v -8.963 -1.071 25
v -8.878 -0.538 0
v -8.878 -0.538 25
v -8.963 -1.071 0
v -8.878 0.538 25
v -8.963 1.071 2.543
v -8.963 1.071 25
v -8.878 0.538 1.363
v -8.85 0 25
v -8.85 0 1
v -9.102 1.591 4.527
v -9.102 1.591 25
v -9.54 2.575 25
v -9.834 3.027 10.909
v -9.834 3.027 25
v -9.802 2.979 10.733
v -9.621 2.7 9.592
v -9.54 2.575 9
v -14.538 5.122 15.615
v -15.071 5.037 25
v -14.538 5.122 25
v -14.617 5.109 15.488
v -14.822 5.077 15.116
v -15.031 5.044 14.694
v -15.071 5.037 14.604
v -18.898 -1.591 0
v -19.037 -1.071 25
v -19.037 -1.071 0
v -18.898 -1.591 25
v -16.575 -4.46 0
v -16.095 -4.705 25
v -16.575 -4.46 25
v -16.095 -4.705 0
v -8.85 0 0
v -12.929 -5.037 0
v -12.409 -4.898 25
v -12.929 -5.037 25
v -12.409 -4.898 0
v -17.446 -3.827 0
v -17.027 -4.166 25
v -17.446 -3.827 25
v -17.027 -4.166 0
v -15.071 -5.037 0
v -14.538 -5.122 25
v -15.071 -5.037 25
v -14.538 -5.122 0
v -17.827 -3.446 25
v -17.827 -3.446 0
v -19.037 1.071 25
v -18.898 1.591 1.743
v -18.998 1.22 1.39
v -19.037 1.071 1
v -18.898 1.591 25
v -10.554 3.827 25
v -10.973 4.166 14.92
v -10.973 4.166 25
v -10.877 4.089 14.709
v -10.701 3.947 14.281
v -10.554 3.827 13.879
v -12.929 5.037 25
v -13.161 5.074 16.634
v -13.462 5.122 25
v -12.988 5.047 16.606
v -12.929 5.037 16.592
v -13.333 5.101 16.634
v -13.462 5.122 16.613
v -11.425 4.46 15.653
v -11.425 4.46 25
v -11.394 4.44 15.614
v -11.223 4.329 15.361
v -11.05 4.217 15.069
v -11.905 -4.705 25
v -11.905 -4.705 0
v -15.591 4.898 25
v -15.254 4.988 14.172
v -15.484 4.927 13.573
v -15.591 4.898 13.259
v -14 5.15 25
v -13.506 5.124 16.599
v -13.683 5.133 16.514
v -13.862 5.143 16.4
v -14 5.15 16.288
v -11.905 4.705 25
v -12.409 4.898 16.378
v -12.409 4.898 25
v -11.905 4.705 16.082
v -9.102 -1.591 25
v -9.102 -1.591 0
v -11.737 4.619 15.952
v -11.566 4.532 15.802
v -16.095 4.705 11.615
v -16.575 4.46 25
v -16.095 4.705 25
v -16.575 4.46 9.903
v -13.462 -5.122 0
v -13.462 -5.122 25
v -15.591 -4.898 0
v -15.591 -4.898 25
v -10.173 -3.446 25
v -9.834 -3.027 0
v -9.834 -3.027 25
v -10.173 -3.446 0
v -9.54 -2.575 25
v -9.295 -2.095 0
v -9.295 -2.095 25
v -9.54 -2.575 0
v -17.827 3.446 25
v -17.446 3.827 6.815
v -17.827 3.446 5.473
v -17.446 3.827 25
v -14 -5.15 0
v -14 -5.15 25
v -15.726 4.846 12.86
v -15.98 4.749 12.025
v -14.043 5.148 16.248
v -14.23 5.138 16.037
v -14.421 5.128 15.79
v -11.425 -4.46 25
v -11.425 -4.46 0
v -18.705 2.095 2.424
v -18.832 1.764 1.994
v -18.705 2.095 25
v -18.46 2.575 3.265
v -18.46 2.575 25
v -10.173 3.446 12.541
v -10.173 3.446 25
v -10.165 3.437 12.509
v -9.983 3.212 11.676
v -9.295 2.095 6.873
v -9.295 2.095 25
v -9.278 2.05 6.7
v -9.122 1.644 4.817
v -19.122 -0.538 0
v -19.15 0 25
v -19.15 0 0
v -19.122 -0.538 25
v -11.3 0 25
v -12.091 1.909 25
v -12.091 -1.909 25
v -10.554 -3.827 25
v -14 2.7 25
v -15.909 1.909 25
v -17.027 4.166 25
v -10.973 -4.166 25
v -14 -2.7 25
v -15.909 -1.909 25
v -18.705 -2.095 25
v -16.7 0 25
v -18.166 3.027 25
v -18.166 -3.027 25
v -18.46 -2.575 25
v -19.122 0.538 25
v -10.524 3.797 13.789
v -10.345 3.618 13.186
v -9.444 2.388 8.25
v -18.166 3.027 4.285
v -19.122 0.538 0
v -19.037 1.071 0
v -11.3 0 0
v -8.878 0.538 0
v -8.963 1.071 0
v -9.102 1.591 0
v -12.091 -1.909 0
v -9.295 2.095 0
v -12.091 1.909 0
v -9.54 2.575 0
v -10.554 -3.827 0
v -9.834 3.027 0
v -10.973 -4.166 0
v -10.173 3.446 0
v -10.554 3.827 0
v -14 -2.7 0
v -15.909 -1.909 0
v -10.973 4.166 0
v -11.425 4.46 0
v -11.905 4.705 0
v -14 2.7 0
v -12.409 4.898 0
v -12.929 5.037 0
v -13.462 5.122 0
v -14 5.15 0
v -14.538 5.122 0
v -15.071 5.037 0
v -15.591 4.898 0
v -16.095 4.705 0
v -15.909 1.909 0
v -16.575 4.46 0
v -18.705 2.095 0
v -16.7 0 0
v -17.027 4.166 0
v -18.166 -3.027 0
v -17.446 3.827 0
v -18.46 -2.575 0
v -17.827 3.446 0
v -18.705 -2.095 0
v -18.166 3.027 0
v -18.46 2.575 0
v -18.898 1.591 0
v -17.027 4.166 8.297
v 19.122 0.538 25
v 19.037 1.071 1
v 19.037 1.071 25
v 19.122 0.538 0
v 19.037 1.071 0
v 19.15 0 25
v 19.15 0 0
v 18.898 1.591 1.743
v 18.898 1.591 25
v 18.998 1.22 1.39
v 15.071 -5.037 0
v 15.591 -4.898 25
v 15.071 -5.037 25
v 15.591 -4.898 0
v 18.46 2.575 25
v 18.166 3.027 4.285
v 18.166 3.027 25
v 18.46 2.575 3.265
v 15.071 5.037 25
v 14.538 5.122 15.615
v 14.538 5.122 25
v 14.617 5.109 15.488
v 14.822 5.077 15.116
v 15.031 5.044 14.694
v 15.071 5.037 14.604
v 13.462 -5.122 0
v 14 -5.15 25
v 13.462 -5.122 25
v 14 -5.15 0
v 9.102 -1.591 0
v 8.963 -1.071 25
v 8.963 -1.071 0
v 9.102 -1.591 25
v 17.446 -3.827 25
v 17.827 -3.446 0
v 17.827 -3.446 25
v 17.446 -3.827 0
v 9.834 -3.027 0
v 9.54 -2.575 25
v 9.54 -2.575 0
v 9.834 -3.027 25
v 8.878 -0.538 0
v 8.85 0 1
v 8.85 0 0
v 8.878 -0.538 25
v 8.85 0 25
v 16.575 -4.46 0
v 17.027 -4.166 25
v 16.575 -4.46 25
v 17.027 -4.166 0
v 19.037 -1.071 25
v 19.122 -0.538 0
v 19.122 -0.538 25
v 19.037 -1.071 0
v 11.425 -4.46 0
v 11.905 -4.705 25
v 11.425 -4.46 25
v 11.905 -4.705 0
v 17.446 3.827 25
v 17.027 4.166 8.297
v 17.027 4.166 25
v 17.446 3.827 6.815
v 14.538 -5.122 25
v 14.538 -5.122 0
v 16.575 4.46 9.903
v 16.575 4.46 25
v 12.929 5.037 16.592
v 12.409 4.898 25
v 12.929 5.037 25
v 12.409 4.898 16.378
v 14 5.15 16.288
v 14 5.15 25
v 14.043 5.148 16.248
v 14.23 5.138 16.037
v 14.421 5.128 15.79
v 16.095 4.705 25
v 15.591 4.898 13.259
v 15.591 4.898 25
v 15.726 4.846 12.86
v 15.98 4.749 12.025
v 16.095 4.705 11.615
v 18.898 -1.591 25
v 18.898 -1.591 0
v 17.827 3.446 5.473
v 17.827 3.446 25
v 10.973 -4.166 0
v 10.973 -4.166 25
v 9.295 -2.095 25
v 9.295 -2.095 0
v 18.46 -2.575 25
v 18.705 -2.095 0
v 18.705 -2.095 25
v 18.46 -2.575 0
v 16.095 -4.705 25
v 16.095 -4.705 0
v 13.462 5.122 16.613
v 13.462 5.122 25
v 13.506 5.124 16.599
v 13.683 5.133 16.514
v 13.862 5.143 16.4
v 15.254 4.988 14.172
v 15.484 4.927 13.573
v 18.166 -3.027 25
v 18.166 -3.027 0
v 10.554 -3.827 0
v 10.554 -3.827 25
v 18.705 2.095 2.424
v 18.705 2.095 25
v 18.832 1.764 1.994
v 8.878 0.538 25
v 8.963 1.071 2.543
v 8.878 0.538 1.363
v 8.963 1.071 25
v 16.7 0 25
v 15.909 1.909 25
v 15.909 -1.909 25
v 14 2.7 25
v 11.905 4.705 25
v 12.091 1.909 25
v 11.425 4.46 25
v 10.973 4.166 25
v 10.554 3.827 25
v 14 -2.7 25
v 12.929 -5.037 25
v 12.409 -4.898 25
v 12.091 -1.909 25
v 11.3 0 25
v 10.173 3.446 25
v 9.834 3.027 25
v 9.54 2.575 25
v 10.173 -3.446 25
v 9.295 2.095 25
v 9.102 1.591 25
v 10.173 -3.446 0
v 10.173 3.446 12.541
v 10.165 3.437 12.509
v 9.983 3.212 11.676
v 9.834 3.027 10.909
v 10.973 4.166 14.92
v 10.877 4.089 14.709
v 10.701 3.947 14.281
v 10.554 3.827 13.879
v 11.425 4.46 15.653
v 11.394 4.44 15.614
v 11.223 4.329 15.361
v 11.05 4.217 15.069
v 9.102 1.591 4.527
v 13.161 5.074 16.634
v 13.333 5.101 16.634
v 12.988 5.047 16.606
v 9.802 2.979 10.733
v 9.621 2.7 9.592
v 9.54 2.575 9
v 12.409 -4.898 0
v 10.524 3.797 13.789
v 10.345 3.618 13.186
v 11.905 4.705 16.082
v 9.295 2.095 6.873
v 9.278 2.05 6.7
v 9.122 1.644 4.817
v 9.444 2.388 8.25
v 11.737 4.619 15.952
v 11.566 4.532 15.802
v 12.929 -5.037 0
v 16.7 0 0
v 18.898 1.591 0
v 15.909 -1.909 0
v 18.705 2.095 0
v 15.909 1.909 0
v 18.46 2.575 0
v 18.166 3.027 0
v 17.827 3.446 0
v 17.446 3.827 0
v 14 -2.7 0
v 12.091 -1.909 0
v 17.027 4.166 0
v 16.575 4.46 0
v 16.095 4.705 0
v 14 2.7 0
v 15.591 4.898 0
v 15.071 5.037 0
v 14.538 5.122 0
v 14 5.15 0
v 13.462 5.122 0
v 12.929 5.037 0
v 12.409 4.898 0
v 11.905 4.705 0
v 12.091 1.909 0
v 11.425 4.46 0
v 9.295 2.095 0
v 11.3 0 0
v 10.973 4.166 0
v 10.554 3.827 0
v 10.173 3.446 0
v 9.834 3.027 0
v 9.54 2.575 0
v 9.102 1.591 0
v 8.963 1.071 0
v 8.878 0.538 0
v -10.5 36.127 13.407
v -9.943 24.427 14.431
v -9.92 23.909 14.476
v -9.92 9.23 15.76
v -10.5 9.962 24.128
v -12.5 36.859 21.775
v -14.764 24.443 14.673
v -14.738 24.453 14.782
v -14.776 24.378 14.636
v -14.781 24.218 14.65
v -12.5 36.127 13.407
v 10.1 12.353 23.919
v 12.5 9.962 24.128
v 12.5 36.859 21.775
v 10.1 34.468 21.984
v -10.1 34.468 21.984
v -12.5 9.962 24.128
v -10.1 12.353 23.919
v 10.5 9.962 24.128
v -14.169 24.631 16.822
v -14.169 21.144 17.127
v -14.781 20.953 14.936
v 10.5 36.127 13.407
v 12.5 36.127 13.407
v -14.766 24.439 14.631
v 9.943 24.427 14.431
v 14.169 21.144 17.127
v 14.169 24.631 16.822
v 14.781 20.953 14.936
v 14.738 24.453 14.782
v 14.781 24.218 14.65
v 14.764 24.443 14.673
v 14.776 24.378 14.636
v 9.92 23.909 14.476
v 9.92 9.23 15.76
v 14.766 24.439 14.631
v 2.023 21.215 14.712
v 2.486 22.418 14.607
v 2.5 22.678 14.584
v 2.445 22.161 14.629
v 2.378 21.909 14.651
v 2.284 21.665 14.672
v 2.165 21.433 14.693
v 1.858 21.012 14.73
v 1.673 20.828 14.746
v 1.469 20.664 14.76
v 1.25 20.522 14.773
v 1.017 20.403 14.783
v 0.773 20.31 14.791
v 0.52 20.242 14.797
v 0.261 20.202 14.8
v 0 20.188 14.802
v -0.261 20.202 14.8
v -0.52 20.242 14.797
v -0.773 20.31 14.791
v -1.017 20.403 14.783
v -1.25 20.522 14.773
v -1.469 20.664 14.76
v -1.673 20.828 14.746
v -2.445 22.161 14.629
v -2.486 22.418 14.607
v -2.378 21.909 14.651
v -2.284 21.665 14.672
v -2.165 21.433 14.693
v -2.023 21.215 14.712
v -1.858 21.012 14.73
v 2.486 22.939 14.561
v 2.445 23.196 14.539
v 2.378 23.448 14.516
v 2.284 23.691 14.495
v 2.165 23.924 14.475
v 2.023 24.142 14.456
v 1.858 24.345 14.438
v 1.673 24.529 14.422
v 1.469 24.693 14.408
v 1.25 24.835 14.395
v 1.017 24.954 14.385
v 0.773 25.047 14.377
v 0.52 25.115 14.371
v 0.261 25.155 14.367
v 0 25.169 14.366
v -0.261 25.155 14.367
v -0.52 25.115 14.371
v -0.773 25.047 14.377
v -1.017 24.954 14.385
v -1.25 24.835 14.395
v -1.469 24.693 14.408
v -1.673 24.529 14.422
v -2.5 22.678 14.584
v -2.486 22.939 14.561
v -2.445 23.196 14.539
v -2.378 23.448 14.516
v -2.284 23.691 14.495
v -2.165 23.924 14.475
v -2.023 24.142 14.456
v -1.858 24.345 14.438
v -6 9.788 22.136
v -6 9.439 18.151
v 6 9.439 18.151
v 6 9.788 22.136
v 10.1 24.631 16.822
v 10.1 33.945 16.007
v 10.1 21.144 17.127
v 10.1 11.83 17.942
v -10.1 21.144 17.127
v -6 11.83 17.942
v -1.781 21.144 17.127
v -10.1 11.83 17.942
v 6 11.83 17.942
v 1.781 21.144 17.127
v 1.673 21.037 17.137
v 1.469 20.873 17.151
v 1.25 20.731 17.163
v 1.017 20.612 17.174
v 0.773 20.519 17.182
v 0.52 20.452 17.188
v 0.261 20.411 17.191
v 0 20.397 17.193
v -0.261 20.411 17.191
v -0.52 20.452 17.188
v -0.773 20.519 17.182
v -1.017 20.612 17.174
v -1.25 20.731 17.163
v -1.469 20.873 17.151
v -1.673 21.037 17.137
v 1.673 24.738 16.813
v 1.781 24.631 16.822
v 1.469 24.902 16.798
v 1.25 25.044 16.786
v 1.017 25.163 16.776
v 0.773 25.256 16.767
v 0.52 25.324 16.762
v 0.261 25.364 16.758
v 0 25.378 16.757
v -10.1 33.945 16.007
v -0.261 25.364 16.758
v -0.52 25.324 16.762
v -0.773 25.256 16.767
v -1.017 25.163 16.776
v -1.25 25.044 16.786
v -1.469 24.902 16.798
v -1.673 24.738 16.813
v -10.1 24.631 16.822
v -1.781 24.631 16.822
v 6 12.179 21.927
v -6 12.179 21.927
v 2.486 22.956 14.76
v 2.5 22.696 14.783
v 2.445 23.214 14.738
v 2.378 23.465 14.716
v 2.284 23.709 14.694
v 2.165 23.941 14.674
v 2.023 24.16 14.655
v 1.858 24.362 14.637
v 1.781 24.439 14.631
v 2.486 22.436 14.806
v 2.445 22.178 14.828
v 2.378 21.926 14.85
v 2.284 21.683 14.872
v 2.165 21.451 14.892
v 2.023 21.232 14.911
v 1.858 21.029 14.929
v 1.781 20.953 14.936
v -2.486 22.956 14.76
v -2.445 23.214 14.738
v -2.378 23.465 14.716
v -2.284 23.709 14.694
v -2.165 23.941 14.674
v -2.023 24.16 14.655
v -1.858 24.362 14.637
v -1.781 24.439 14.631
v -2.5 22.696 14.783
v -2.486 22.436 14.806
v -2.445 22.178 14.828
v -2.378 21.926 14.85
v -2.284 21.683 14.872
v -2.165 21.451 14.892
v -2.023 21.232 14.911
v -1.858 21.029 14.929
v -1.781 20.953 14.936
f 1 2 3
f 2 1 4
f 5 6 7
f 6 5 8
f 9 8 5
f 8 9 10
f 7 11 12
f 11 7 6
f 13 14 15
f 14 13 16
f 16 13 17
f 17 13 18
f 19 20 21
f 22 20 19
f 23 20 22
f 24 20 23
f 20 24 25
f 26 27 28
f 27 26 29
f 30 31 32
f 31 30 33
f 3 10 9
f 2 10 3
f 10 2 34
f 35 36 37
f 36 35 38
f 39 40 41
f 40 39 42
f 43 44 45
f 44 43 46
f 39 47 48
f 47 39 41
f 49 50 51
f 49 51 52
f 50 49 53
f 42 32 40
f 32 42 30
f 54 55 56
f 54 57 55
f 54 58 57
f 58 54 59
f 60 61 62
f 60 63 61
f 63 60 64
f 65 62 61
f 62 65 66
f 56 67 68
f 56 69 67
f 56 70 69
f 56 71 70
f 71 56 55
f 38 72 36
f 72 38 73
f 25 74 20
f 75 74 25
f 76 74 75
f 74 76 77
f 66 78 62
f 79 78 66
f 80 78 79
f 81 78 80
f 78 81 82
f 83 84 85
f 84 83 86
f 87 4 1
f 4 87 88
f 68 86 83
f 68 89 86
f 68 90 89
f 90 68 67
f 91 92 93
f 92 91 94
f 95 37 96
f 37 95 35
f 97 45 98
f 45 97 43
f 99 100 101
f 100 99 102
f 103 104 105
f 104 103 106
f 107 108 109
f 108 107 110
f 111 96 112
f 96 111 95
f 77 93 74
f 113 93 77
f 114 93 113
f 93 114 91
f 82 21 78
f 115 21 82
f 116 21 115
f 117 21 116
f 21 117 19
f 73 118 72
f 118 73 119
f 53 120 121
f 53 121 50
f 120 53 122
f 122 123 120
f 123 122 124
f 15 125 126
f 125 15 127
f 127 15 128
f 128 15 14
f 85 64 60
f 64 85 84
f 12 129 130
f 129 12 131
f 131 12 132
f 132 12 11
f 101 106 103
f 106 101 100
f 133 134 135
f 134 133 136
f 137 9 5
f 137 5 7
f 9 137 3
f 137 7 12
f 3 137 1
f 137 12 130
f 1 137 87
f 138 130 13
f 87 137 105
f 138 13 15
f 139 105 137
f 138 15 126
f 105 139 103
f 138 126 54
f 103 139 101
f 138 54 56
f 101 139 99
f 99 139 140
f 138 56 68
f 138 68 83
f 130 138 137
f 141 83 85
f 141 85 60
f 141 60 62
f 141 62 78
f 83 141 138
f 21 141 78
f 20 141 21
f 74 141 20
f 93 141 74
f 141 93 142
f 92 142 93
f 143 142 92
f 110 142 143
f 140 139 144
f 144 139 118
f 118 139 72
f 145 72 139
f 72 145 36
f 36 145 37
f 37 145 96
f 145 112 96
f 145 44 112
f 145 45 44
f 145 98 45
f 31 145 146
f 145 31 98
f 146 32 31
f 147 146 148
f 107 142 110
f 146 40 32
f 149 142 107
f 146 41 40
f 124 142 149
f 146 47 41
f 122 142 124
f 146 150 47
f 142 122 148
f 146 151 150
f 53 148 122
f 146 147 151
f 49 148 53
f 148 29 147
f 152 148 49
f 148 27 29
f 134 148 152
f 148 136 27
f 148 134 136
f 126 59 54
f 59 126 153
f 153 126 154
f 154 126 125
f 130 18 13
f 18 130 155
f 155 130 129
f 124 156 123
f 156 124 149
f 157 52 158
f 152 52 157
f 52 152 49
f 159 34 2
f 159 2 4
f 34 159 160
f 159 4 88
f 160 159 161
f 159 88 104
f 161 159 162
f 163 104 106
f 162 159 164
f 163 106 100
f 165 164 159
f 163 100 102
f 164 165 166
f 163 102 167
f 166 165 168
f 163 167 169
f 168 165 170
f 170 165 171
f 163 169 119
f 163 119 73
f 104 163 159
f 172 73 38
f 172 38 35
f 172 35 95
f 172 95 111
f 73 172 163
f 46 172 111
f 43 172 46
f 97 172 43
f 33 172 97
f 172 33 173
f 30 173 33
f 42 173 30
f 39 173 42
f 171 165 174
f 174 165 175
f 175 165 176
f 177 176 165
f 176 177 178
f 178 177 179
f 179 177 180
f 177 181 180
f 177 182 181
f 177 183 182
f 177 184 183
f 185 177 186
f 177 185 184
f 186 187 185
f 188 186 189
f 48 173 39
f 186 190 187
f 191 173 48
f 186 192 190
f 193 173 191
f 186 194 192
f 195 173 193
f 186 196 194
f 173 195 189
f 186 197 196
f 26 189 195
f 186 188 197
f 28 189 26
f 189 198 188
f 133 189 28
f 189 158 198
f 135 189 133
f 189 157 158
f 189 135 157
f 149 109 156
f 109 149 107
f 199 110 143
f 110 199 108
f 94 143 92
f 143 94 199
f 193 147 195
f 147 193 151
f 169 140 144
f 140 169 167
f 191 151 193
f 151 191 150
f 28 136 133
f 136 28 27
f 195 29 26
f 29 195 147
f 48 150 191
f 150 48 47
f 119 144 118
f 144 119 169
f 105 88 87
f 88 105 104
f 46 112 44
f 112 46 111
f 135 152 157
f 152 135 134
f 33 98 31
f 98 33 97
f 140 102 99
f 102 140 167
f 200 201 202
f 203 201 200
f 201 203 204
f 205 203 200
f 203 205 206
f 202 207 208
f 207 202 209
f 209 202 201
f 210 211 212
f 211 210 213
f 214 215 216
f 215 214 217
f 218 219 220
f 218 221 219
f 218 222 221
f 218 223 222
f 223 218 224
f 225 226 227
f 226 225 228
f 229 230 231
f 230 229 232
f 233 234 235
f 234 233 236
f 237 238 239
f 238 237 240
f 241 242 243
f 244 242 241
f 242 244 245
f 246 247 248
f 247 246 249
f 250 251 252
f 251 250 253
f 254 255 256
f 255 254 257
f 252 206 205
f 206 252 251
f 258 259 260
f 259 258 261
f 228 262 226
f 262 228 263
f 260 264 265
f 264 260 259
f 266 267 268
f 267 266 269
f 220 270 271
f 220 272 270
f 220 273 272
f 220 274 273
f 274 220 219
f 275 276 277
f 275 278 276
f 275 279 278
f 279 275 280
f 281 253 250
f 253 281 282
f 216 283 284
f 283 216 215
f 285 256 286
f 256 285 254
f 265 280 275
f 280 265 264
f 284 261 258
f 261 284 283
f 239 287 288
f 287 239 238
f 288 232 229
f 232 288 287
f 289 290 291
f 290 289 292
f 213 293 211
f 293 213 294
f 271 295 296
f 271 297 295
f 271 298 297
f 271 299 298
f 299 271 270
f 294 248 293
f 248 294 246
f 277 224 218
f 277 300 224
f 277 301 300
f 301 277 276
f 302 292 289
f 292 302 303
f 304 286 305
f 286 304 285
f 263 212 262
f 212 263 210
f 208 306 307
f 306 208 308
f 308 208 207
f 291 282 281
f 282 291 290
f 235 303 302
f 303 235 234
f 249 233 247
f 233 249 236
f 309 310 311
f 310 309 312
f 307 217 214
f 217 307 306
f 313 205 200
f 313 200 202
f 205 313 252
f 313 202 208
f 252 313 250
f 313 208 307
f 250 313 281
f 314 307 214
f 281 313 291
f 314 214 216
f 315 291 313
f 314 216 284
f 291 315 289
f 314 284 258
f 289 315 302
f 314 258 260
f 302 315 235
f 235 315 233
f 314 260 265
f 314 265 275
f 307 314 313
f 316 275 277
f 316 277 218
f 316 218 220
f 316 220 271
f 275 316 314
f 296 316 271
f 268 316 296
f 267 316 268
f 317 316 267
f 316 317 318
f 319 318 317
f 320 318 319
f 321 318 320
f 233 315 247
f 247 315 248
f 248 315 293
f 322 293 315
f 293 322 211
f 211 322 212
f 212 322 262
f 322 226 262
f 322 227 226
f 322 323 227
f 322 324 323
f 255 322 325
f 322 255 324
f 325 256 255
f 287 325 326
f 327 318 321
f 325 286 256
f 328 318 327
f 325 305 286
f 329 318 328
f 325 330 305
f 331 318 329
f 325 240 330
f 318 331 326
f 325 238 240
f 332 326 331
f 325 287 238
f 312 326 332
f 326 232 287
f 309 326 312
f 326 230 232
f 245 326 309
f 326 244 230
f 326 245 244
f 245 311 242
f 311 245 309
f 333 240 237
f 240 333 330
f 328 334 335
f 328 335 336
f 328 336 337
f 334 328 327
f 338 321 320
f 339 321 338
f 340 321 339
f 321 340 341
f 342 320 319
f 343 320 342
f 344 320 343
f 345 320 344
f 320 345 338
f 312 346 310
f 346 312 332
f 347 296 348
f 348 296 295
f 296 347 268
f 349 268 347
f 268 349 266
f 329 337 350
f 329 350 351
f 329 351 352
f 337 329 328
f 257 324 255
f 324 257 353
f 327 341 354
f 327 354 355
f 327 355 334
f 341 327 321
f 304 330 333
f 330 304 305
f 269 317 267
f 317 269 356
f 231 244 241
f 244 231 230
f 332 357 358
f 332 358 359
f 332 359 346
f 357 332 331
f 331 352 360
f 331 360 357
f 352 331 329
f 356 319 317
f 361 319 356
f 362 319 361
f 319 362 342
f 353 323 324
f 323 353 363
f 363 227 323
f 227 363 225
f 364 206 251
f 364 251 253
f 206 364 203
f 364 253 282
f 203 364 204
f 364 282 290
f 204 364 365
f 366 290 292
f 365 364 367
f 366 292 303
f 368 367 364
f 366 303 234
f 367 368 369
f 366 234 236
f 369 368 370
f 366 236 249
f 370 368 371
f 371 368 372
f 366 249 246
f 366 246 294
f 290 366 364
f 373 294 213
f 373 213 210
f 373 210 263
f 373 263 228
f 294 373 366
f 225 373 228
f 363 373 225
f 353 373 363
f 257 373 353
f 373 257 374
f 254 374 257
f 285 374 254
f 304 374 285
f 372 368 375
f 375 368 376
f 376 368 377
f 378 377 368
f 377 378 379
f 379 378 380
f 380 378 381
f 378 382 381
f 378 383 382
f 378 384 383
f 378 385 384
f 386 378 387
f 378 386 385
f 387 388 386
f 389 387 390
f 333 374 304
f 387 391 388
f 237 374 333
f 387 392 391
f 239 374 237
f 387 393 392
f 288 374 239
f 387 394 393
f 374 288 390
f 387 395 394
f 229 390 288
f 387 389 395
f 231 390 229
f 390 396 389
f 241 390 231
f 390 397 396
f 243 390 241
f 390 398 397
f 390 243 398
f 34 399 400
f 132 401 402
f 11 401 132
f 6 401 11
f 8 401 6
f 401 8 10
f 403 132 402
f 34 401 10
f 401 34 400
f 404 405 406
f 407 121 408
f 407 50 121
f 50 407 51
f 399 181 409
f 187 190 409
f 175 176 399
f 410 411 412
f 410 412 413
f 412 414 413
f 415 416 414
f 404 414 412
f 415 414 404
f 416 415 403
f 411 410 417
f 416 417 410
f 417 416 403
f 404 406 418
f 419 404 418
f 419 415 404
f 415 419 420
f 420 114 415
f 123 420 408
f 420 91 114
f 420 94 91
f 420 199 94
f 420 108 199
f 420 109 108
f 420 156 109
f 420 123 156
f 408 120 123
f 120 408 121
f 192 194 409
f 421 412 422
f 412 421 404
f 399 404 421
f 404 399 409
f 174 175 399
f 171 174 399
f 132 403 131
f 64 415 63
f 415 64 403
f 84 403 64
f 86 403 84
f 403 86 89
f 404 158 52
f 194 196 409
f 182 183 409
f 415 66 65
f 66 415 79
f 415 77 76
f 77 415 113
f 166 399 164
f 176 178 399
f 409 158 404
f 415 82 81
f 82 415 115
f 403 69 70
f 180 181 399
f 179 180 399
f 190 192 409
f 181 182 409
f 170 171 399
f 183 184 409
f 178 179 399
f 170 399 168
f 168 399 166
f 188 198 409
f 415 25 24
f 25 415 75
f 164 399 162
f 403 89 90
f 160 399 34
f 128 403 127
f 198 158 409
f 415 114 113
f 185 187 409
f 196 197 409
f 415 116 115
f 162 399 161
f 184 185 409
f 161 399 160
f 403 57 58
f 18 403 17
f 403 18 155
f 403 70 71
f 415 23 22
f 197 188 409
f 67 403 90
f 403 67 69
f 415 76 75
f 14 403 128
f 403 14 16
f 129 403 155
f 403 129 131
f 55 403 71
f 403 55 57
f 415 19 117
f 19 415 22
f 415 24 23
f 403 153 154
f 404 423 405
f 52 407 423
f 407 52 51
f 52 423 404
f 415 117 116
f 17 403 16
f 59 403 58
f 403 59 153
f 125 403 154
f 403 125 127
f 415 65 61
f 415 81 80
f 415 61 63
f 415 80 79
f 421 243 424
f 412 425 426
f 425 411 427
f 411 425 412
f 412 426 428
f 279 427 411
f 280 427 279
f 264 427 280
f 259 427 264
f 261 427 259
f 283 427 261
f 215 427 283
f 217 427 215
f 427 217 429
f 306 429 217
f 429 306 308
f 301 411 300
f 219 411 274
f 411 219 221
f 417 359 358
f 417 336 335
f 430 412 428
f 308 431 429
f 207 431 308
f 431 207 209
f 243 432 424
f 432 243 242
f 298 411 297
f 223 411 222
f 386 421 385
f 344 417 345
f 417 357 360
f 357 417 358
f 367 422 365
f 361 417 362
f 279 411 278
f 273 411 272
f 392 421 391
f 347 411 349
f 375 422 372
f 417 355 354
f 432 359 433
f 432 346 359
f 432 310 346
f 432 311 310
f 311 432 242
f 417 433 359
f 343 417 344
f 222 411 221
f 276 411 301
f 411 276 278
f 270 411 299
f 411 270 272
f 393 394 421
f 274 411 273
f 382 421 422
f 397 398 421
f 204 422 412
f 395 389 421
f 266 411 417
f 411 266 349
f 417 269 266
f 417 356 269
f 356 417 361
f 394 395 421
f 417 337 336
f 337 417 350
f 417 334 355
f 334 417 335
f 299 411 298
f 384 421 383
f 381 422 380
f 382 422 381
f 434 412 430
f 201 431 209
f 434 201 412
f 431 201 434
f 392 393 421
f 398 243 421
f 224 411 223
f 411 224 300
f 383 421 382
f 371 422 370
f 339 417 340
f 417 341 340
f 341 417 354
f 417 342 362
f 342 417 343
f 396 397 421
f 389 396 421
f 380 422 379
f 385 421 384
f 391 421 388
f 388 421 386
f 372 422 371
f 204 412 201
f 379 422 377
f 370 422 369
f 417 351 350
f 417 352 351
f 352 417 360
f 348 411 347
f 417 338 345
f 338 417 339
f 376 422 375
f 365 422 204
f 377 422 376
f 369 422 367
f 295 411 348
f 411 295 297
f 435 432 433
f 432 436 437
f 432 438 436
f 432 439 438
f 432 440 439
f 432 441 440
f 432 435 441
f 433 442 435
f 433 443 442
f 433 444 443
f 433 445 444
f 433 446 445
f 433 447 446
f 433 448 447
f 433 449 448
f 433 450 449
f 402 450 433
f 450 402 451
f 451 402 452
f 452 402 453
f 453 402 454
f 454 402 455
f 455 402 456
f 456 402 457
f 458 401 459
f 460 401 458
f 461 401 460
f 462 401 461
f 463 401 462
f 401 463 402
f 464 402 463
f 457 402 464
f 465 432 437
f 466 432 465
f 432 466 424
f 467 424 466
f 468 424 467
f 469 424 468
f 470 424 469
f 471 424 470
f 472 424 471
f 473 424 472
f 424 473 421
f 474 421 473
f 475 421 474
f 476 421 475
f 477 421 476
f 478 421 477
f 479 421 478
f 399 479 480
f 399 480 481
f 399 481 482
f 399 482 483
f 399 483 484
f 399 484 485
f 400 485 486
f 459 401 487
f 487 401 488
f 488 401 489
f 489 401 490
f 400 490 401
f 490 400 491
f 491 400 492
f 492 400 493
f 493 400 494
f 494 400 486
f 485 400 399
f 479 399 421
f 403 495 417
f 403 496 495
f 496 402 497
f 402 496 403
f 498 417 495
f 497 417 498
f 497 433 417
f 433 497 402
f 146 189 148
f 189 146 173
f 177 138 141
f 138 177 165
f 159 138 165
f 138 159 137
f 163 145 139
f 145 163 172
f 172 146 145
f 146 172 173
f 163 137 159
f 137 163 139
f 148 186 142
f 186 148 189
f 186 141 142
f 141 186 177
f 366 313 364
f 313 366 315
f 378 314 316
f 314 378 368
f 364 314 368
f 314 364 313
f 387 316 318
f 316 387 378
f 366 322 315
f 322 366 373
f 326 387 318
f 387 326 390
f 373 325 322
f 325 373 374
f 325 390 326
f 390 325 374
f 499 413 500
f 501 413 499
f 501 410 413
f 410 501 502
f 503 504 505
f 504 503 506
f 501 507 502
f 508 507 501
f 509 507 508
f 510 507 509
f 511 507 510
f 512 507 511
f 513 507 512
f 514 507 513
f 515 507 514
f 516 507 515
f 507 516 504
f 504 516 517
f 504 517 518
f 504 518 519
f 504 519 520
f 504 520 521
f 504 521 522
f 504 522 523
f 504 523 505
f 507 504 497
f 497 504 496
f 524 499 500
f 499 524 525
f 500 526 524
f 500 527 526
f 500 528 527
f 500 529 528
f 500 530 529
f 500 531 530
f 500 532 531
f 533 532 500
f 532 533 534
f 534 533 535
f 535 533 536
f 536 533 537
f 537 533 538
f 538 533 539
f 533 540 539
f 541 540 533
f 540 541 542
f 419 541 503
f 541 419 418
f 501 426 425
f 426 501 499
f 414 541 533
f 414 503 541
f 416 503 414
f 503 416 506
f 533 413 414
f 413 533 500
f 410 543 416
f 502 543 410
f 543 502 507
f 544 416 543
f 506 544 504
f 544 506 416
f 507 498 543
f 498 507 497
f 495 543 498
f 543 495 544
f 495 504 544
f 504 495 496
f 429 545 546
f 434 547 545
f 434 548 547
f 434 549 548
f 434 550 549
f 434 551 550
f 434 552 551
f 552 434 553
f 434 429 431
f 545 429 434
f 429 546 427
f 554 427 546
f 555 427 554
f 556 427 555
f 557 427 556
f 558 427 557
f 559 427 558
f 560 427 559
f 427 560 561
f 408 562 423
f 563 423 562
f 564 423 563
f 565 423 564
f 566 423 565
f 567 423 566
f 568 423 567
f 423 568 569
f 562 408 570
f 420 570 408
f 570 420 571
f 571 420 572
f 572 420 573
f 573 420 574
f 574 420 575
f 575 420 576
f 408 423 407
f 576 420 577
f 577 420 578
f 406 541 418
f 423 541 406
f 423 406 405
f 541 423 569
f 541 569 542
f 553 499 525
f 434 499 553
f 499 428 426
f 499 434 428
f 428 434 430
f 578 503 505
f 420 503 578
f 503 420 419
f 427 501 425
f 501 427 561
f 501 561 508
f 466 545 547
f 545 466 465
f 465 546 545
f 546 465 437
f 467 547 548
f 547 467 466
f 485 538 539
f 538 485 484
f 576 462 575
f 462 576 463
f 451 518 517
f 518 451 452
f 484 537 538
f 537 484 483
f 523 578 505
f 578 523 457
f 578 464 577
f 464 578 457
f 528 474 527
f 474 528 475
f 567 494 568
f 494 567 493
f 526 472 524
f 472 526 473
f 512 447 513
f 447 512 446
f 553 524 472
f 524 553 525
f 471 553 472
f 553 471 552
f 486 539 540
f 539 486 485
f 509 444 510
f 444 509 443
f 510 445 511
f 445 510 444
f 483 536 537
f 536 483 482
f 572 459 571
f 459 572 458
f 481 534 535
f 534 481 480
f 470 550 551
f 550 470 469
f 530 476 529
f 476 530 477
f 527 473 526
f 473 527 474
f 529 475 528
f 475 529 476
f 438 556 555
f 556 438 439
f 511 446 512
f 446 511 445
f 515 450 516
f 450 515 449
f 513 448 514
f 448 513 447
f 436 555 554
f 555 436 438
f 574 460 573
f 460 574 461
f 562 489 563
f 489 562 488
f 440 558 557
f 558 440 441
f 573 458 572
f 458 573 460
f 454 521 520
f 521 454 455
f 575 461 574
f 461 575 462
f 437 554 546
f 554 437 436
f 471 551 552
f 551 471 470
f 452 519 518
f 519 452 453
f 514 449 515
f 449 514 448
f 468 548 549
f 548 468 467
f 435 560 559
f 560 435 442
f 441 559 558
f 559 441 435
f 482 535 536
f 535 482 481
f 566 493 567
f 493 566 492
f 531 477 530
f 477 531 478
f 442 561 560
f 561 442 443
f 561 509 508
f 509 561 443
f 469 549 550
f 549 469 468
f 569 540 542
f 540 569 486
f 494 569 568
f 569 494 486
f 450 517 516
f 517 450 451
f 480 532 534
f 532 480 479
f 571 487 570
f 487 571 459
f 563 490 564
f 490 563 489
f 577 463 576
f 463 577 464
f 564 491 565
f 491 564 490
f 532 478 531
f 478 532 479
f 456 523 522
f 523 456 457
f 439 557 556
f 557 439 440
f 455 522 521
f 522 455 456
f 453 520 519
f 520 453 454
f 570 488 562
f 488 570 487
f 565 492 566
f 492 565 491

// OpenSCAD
// =============================================================================
// PROJECT: UNIVERSAL GPS STANDOFF MOUNT
// VERSION: 2.9 (Full Parametric Entry - X/Z Window Control)
// =============================================================================

/* [1. FRAME SETTINGS] */
standoff_dist   = 28.0;  
standoff_dia    = 5.5;   
standoff_height = 25.0;  
wall_thickness  = 2.4; 

/* [2. GPS COMPARTMENT SETTINGS] */
gps_angle       = 5;    
gps_offset      = 10.0;  
gps_w           = 20.2;  
gps_l           = 22.2;  
gps_d           = 6.0;   

/* [3. WIRE WINDOW SETTINGS] */
// Width of the rear wire entrance slot (mm)
wire_window_w   = 12.0;  
// Height of the rear wire entrance slot (mm)
wire_window_h   = 4.0;   
// Horizontal offset: 0 = Centered. (+) is Right, (-) is Left.
wire_window_x   = 0.0;
// Vertical offset: 0 = Bottom of cavity. Increase to move window up.
wire_window_z   = 0.0;   

/* [4. HARDWARE & RETENTION] */
ziptie_width    = 3.5;   
ziptie_thick    = 2.2; 
wire_hole_dia   = 5.0; 

/* [5. INTERNAL CALCULATIONS] */
$fn = 60;
box_w = gps_w + (wall_thickness * 2);
box_l = gps_l + (wall_thickness * 2);
box_d = gps_d + wall_thickness; 

// =============================================================================
// MAIN ASSEMBLY
// =============================================================================

difference() {
    // --- STEP 1: SOLID BODY ---
    union() {
        for(i=[-1, 1]) {
            translate([i * standoff_dist/2, 0, 0])
                cylinder(h=standoff_height, d=standoff_dia + (wall_thickness*2));
        }

        translate([0, 0, standoff_height]) 
            rotate([-gps_angle, 0, 0])
                translate([0, gps_offset + (box_l/2), -box_d/2]) 
                    cube([box_w, box_l, box_d], center=true);

        for(i=[-1, 1]) {
            hull() {
                translate([0, 0, standoff_height]) 
                    rotate([-gps_angle, 0, 0])
                        translate([i * (box_w/2 - 1), gps_offset + (box_l/2), -box_d/2])
                            cube([2, box_l, box_d], center=true);
                translate([i * standoff_dist/2, 0, 0])
                    cylinder(h=1, d=standoff_dia + (wall_thickness*2));
            }
        }
    }

    // --- STEP 2: SUBTRACTIONS ---
    
    // A. Standoff Holes
    for(i=[-1, 1]) {
        translate([i * standoff_dist/2, 0, -1])
            cylinder(h=standoff_height + 2, d=standoff_dia - 0.1, $fn=8);
    }

    // B. Internal Cavity Group (Angled Box Interior)
    translate([0, 0, standoff_height])
        rotate([-gps_angle, 0, 0])
            translate([0, gps_offset + (box_l/2), 0]) {
                
                // 1. The Main GPS Cavity
                translate([0, 0, -gps_d/2 + 0.1])
                    cube([gps_w, gps_l, gps_d + 0.2], center=true);
                
                // 2. THE REAR WIRE WINDOW (Now with X and Z adjustment)
                translate([wire_window_x, -gps_l/2, -gps_d + (wire_window_h/2) + wire_window_z])
                    cube([wire_window_w, wall_thickness * 6, wire_window_h], center=true);

                // 3. Zip-Tie Trench & Side Windows
                translate([0, 0, -gps_d - (ziptie_thick/2)])
                    cube([box_w + 50, ziptie_width, ziptie_thick], center=true);
                
                // 4. Floor Push-out Port
                translate([0, 0, -50])
                    cylinder(h=100, d=wire_hole_dia);
            }
}
